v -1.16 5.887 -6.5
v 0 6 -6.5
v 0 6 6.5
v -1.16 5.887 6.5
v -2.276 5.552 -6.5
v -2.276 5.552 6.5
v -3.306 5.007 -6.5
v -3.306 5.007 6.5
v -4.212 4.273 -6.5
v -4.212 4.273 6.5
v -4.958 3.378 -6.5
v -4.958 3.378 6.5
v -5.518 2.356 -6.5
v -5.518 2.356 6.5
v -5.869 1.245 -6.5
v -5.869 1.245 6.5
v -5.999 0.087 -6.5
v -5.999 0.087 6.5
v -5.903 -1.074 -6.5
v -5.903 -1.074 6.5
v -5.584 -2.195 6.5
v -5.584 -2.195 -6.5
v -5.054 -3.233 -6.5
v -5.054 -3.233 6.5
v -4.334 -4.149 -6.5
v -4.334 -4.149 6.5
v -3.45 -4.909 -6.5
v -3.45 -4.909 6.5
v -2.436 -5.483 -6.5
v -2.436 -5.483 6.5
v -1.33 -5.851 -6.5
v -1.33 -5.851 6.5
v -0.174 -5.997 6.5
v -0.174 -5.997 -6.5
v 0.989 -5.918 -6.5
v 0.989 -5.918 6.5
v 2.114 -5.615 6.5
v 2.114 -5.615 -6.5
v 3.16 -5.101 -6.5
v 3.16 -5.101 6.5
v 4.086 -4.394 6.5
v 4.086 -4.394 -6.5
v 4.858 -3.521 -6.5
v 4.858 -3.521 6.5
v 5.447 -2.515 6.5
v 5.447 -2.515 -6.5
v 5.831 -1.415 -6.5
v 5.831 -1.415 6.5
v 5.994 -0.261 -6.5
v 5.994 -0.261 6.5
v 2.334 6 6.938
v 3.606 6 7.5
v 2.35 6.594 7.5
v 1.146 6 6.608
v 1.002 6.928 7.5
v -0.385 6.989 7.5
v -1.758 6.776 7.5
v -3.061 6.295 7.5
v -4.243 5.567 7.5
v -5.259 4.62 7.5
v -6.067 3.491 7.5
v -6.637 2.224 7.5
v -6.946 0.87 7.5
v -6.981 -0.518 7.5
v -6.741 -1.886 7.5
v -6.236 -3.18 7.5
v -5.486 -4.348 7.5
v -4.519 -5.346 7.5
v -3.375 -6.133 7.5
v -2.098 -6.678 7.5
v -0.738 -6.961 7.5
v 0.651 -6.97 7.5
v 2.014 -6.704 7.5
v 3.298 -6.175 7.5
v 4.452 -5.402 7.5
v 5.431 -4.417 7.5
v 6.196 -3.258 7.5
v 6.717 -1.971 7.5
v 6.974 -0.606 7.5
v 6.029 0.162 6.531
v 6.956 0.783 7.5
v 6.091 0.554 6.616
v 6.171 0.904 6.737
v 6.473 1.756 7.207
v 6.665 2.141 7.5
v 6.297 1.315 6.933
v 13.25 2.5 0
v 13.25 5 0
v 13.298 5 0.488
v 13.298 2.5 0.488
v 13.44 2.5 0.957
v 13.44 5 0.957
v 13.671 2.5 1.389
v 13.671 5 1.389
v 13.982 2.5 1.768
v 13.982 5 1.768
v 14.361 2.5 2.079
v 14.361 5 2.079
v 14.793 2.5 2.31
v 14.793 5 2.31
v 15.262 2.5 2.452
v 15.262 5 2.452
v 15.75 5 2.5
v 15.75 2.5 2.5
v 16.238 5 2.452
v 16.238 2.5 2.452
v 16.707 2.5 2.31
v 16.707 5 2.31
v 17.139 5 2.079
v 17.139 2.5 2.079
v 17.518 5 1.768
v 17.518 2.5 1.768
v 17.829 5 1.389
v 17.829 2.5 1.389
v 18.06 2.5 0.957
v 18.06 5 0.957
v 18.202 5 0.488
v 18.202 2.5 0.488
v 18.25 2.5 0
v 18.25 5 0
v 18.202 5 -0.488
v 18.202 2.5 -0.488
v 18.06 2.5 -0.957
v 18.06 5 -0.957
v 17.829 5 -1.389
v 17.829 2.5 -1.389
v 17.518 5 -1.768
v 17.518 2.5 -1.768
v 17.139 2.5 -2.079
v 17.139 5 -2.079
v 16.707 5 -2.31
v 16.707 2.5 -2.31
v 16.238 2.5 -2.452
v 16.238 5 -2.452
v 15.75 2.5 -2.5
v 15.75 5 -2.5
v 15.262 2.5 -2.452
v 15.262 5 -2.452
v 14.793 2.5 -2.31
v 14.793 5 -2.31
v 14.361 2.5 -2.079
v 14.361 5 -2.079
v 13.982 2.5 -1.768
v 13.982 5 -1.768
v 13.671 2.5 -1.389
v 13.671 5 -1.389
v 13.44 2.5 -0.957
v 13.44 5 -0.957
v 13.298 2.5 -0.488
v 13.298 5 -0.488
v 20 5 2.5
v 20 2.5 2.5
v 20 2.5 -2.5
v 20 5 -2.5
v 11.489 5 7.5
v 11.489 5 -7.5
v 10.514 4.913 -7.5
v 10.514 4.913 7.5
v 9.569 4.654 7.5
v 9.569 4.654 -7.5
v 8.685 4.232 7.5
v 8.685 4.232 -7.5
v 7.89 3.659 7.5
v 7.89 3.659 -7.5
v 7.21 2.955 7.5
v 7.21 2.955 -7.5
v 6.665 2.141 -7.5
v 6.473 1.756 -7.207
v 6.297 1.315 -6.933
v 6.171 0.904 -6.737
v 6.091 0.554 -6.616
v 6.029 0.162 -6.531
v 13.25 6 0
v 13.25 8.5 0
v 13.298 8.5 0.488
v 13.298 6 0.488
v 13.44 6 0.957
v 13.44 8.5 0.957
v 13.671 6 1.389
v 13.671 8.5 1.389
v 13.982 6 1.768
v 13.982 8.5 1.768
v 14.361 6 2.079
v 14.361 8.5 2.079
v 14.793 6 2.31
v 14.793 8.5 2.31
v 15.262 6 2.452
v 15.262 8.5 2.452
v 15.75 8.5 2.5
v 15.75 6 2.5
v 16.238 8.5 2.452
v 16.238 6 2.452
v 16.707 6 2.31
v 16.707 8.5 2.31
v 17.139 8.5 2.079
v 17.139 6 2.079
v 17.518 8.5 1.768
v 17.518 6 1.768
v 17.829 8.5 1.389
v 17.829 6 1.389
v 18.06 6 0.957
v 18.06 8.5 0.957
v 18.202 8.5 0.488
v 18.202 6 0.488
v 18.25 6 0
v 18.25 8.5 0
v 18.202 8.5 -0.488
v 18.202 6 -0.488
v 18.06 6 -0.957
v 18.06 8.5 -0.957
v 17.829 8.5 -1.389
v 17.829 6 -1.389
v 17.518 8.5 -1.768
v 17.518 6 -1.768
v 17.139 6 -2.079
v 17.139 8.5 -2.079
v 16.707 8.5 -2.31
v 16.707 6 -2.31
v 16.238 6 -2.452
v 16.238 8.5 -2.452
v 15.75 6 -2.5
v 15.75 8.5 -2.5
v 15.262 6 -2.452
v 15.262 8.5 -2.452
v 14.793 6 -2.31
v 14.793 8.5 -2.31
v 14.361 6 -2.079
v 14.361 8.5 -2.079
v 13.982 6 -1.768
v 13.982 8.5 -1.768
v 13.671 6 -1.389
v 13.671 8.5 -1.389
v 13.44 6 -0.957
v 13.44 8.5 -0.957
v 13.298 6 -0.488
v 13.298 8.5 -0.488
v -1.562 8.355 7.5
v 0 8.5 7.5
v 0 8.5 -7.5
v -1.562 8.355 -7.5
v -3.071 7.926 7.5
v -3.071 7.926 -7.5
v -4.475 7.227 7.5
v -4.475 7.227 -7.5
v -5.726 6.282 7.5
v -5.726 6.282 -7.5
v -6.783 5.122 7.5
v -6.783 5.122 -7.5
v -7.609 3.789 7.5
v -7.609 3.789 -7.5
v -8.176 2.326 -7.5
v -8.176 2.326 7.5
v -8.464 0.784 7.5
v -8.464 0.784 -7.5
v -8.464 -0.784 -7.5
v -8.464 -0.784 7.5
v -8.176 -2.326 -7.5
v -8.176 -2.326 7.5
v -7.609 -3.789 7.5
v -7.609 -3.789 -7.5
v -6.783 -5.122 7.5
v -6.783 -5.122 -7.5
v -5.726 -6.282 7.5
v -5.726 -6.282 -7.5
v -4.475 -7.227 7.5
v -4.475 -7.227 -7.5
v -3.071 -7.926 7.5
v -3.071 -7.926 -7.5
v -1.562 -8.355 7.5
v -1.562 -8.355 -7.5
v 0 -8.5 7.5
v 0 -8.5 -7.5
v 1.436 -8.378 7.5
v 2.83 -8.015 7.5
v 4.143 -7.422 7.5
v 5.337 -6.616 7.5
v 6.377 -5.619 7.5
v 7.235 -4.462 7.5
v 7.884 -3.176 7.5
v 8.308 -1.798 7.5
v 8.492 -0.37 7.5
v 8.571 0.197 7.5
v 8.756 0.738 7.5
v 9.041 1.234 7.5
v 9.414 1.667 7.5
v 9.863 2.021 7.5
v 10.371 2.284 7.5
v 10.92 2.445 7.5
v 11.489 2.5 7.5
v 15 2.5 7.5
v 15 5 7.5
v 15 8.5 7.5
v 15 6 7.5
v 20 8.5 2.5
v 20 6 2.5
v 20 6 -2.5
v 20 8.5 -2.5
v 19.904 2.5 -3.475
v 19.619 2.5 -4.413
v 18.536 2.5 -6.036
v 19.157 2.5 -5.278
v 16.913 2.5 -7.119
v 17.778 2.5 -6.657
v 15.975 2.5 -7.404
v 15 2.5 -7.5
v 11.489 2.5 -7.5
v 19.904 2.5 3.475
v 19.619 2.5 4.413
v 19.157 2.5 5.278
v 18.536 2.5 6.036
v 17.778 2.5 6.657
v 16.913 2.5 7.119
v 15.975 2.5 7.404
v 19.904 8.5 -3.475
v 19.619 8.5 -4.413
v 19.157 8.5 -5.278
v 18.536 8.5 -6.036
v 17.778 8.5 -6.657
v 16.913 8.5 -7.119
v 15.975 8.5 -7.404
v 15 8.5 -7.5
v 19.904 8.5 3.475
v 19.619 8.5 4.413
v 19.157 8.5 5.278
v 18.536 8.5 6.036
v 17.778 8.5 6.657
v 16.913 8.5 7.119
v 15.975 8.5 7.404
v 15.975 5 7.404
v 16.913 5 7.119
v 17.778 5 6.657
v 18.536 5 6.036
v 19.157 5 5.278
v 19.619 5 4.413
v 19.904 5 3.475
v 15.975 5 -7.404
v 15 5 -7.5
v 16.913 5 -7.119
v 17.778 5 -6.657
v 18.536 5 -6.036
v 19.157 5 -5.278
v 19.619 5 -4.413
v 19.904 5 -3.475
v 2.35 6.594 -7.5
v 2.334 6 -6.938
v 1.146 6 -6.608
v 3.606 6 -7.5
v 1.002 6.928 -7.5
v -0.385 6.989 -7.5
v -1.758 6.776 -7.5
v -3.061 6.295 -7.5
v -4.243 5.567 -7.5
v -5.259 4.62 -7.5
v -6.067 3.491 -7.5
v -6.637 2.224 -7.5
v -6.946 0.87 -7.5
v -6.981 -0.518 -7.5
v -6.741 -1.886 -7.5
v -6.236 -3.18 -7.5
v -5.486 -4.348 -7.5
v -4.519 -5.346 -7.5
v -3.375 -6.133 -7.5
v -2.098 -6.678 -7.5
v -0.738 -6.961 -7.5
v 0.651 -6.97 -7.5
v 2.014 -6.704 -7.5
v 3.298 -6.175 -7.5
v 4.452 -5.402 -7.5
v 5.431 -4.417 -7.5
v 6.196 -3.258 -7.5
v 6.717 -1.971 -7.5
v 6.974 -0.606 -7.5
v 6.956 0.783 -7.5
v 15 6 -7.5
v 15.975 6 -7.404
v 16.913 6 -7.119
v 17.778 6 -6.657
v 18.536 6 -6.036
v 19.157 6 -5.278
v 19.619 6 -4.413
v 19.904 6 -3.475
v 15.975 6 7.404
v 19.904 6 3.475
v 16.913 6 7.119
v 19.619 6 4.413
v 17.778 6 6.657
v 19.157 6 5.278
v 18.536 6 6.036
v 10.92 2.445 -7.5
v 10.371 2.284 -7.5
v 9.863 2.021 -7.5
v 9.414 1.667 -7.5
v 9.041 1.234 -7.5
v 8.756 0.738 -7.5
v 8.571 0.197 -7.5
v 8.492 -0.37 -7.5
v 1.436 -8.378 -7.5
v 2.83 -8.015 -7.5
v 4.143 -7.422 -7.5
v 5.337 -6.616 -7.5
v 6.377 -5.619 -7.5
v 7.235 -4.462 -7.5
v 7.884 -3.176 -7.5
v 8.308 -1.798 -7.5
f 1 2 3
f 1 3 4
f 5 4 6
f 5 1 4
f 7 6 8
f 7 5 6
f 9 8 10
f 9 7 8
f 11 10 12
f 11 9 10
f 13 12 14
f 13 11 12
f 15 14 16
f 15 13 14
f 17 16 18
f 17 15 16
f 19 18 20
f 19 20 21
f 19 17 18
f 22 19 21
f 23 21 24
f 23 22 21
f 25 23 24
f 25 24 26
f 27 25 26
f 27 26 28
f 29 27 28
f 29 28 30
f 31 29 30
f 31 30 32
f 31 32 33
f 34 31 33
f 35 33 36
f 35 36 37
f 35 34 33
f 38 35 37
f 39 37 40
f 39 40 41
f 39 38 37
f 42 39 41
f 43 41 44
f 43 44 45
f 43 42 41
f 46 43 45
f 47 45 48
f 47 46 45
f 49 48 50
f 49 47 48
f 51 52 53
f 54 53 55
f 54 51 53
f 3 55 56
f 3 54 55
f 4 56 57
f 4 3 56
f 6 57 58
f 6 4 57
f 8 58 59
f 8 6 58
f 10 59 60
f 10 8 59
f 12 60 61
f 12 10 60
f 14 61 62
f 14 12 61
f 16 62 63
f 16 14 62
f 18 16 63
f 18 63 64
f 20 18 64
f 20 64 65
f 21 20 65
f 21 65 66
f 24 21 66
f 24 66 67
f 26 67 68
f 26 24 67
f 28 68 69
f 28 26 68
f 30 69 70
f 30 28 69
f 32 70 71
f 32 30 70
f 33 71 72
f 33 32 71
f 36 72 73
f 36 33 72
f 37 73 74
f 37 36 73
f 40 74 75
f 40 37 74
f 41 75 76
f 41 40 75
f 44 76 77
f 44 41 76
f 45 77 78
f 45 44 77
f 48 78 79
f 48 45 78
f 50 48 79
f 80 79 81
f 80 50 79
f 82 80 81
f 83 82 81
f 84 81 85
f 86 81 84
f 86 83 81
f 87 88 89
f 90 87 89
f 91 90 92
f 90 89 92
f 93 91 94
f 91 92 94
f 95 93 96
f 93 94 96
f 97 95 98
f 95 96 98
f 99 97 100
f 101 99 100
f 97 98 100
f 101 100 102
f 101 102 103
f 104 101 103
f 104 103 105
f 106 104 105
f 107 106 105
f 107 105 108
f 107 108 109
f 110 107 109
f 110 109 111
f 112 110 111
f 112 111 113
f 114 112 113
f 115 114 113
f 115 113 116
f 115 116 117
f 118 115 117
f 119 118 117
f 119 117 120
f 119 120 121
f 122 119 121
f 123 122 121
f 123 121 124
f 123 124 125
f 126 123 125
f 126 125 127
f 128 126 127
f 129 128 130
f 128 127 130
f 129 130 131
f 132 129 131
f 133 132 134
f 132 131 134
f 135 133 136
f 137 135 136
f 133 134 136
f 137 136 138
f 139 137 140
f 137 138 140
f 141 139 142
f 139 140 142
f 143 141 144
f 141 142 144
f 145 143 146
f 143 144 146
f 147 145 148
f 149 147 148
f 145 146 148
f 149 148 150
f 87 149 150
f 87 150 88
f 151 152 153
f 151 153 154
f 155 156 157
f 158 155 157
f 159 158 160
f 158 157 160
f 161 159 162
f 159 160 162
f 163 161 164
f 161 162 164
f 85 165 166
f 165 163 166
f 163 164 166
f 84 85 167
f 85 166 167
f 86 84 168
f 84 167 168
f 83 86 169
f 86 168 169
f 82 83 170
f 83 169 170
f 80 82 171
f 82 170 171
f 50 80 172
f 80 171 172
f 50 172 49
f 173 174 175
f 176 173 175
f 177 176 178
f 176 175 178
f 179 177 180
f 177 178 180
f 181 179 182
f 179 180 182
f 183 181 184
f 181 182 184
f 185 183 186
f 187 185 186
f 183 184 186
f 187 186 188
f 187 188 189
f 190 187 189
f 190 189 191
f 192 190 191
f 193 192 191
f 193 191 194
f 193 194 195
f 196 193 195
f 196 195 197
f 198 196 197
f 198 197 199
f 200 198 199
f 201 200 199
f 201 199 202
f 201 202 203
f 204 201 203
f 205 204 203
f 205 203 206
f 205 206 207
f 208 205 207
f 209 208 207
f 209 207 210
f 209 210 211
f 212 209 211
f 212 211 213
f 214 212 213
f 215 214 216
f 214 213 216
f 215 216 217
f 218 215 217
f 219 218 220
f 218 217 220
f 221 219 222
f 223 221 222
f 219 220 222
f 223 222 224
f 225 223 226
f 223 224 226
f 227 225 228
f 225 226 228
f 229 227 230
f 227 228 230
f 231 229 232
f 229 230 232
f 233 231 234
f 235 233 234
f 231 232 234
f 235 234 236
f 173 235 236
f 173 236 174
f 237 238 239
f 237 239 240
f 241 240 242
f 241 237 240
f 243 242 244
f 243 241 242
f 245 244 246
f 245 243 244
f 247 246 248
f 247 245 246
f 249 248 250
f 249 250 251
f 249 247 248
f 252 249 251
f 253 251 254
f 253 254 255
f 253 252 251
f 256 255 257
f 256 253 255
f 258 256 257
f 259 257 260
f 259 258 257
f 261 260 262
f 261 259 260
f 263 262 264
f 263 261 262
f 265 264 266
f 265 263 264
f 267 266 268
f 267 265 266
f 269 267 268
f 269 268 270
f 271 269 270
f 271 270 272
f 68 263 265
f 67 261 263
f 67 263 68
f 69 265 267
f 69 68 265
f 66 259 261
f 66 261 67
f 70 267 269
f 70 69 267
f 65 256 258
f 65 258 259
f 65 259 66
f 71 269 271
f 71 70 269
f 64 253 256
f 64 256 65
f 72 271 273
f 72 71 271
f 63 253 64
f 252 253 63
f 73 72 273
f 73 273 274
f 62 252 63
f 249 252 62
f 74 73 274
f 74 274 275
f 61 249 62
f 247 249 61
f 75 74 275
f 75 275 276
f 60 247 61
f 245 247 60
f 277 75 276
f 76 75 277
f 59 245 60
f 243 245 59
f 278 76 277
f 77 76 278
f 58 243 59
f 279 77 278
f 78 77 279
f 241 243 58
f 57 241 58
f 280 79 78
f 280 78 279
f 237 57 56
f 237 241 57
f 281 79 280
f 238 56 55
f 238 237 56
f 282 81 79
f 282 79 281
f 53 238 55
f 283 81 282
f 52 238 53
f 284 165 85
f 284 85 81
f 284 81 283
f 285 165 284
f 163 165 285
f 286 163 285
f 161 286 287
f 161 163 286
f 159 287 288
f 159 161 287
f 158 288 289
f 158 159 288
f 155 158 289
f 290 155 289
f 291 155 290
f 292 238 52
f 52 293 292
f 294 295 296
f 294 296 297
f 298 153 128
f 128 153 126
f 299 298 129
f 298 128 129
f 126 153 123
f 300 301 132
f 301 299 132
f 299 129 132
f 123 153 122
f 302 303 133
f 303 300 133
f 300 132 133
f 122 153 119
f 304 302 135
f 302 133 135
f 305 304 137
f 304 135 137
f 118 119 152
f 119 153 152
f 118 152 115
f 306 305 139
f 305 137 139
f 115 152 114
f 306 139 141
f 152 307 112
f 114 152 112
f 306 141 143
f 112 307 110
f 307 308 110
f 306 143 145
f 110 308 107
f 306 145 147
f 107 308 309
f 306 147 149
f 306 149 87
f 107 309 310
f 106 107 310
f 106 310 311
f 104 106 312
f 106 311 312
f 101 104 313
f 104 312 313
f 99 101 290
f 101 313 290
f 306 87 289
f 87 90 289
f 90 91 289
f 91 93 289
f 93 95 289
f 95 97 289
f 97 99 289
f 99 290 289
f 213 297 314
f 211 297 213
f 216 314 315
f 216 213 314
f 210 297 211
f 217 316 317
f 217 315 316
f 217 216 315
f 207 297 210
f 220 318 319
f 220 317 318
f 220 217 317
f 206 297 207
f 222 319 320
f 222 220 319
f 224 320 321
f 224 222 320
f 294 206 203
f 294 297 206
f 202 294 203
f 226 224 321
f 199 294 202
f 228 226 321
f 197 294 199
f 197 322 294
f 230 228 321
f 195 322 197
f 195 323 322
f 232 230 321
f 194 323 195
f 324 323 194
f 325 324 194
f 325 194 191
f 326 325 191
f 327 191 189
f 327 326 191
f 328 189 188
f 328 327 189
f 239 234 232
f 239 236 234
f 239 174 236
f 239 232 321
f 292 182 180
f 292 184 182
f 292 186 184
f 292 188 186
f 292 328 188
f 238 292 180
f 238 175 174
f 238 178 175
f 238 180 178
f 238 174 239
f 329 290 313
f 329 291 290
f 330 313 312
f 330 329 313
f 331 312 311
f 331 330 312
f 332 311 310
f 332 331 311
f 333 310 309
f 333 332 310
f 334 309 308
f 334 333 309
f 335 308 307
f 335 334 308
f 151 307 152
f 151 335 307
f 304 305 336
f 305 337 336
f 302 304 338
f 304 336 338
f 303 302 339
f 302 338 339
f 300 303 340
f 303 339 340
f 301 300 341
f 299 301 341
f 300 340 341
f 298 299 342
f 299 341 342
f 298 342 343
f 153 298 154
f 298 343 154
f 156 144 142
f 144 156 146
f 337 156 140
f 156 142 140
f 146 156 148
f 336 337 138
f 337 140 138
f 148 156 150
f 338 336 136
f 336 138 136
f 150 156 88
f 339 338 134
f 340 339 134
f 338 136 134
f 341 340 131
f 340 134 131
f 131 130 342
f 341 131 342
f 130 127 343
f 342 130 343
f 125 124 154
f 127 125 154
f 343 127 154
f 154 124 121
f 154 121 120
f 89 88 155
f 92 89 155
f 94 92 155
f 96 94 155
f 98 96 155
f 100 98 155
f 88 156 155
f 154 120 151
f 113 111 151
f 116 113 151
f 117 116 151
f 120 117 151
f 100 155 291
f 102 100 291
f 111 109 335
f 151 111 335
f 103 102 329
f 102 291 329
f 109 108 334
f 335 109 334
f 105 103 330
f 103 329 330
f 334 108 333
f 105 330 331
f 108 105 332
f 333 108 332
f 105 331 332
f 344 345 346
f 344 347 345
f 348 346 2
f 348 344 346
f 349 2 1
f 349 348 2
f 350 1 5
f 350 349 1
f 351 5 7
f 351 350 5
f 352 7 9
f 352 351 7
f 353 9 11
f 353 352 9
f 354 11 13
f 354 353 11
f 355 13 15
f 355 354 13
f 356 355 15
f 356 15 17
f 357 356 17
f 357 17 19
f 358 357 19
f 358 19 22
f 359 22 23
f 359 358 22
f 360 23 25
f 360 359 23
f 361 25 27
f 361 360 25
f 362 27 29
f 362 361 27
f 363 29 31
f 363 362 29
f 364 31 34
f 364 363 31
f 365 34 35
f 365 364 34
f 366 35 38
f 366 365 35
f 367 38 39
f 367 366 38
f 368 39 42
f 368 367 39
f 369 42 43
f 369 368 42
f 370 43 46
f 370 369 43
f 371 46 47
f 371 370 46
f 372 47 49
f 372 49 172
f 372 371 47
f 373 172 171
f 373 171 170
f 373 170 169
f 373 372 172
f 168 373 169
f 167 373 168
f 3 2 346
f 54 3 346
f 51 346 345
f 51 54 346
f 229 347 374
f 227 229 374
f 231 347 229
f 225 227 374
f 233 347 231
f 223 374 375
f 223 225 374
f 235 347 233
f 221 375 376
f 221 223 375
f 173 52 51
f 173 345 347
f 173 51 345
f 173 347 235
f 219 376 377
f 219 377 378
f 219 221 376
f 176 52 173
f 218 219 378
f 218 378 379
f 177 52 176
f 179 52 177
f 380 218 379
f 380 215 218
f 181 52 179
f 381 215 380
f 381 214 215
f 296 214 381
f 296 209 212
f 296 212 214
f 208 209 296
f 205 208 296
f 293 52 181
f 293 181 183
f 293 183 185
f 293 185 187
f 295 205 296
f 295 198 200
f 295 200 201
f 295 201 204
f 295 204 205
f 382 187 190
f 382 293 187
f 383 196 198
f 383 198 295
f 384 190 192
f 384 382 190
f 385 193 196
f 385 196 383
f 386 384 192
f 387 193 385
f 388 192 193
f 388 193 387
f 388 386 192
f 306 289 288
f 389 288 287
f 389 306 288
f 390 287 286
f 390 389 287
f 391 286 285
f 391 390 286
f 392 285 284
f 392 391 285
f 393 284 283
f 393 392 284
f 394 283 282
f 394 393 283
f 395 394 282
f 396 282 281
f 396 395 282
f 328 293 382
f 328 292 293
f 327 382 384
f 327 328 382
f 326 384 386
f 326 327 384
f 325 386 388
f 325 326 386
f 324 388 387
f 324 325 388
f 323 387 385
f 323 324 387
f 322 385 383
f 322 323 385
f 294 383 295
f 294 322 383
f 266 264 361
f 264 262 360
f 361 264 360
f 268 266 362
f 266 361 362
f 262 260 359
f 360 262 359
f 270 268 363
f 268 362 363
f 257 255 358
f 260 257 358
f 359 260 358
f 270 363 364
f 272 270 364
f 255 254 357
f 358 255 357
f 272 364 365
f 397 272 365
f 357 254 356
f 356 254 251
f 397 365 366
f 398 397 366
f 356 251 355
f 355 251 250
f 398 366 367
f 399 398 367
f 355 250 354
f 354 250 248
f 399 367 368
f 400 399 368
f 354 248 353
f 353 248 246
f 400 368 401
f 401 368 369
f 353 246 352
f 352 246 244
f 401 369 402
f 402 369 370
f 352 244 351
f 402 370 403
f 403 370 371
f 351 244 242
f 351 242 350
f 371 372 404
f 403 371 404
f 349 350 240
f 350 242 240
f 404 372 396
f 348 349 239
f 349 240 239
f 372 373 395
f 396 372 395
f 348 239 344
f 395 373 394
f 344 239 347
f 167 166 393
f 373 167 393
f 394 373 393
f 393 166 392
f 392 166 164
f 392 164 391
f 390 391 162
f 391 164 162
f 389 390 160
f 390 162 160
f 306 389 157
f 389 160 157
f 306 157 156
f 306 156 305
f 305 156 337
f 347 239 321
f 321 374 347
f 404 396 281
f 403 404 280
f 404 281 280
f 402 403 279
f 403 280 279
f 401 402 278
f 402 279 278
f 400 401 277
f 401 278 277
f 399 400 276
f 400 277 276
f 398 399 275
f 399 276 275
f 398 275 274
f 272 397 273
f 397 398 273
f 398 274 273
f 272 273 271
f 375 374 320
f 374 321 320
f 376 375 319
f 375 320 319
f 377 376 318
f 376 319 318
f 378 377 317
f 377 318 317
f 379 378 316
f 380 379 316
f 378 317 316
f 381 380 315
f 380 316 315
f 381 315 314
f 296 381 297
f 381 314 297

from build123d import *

# Parameters (mm, degrees)
F0_R          = 6
F1_DEPTH      = 7.5
F2_SIZE       = 1
F3_SIZE       = 1
F5_DEPTH      = 49
F5_DEPTH_BACK = 15.001
F6_R          = 3
F7_W          = 20
F7_H          = 1
F8_DEPTH      = 15.001
F9_T1_DEPTH   = 53.8625025136
F10_R         = 5
F12_D         = 5


# Not quite as in the source:
# - a fillet or chamfer that OpenCascade refuses, or shapes differently, is made with other operations: its cross-section is extruded or revolved along the edge and cut away or added
# - an extrude ends at something that could not be found from the text; its depth is read off the source's solid


with BuildPart() as f1:
    # F0 (on Top) → F1 (new body, symmetric)
    with BuildSketch(Plane.XY):
        with BuildLine():
            Line((20, 8.5), (0, 8.5))
            ThreePointArc((0, 8.5), (-8.5, 0), (0, -8.5))
            Line((0, -8.5), (20, -8.5))
            Line((20, -8.5), (20, 8.5))
        make_face()
        Circle(F0_R, mode=Mode.SUBTRACT)
    extrude(amount=F1_DEPTH, both=True)

    # F2
    f2_edges = [f1.edges().sort_by_distance(p)[0] for p in [
        (-6, 0, 7.5),
    ]]
    chamfer(f2_edges, length=F2_SIZE)

    # F3
    f3_edges = [f1.edges().sort_by_distance(p)[0] for p in [
        (-6, 0, -7.5),
    ]]
    chamfer(f3_edges, length=F3_SIZE)

    # F4 (on face) → F5 (cut, two sides)
    with BuildSketch(Plane.XY.offset(7.5)) as f5_sk:
        with BuildLine():
            ThreePointArc((8.1240384046, 2.5), (6.8373971656, -5.0497524692), (0, -8.5))
            Line((0, -8.5), (20, -8.5))
            Line((20, -8.5), (20, 2.5))
            Line((20, 2.5), (8.1240384046, 2.5))
        make_face()
    extrude(amount=F5_DEPTH, mode=Mode.SUBTRACT)
    extrude(f5_sk.sketch, amount=-F5_DEPTH_BACK, mode=Mode.SUBTRACT)

    # F6
    f6_edges = [f1.edges().sort_by_distance(p)[0] for p in [
        (8.124038, 2.5, 0),
    ]]
    fillet(f6_edges, radius=F6_R)

    # F7 (on face) → F8 (cut, through all)
    with BuildSketch(Plane.XY.offset(7.5)):
        with Locations((10, 5.5)):
            Rectangle(F7_W, F7_H)
    extrude(amount=-F8_DEPTH, mode=Mode.SUBTRACT)

    # F9: fillet of radius 5.5 on 1 edges, made by hand

    # F9_s2 → F9_t1 (cut)
    with BuildSketch(Plane.XY.offset(-26.9312512568)):
        with BuildLine():
            ThreePointArc((11.4891252931, 5), (7.6855228816, 3.4727331518), (5.9943262399, -0.2608695652))
            ThreePointArc((5.9943262399, -0.2608695652), (5.3472085631, 2.7216466675), (3.3166247904, 5))
            Line((3.3166247904, 5), (11.4891252931, 5))
        make_face()
    extrude(amount=F9_T1_DEPTH, mode=Mode.SUBTRACT)

    # F10
    f10_edges = [f1.edges().sort_by_distance(p)[0] for p in [
        (20, 7.25, -7.5),
        (20, 3.75, 7.5),
        (20, 7.25, 7.5),
        (20, 3.75, -7.5),
    ]]
    fillet(f10_edges, radius=F10_R)

    # F12 (through all)
    with Locations(Plane.XZ.offset(-2.5)):
        with Locations((15.75, 0)):
            Hole(F12_D / 2)


solid = f1.part
